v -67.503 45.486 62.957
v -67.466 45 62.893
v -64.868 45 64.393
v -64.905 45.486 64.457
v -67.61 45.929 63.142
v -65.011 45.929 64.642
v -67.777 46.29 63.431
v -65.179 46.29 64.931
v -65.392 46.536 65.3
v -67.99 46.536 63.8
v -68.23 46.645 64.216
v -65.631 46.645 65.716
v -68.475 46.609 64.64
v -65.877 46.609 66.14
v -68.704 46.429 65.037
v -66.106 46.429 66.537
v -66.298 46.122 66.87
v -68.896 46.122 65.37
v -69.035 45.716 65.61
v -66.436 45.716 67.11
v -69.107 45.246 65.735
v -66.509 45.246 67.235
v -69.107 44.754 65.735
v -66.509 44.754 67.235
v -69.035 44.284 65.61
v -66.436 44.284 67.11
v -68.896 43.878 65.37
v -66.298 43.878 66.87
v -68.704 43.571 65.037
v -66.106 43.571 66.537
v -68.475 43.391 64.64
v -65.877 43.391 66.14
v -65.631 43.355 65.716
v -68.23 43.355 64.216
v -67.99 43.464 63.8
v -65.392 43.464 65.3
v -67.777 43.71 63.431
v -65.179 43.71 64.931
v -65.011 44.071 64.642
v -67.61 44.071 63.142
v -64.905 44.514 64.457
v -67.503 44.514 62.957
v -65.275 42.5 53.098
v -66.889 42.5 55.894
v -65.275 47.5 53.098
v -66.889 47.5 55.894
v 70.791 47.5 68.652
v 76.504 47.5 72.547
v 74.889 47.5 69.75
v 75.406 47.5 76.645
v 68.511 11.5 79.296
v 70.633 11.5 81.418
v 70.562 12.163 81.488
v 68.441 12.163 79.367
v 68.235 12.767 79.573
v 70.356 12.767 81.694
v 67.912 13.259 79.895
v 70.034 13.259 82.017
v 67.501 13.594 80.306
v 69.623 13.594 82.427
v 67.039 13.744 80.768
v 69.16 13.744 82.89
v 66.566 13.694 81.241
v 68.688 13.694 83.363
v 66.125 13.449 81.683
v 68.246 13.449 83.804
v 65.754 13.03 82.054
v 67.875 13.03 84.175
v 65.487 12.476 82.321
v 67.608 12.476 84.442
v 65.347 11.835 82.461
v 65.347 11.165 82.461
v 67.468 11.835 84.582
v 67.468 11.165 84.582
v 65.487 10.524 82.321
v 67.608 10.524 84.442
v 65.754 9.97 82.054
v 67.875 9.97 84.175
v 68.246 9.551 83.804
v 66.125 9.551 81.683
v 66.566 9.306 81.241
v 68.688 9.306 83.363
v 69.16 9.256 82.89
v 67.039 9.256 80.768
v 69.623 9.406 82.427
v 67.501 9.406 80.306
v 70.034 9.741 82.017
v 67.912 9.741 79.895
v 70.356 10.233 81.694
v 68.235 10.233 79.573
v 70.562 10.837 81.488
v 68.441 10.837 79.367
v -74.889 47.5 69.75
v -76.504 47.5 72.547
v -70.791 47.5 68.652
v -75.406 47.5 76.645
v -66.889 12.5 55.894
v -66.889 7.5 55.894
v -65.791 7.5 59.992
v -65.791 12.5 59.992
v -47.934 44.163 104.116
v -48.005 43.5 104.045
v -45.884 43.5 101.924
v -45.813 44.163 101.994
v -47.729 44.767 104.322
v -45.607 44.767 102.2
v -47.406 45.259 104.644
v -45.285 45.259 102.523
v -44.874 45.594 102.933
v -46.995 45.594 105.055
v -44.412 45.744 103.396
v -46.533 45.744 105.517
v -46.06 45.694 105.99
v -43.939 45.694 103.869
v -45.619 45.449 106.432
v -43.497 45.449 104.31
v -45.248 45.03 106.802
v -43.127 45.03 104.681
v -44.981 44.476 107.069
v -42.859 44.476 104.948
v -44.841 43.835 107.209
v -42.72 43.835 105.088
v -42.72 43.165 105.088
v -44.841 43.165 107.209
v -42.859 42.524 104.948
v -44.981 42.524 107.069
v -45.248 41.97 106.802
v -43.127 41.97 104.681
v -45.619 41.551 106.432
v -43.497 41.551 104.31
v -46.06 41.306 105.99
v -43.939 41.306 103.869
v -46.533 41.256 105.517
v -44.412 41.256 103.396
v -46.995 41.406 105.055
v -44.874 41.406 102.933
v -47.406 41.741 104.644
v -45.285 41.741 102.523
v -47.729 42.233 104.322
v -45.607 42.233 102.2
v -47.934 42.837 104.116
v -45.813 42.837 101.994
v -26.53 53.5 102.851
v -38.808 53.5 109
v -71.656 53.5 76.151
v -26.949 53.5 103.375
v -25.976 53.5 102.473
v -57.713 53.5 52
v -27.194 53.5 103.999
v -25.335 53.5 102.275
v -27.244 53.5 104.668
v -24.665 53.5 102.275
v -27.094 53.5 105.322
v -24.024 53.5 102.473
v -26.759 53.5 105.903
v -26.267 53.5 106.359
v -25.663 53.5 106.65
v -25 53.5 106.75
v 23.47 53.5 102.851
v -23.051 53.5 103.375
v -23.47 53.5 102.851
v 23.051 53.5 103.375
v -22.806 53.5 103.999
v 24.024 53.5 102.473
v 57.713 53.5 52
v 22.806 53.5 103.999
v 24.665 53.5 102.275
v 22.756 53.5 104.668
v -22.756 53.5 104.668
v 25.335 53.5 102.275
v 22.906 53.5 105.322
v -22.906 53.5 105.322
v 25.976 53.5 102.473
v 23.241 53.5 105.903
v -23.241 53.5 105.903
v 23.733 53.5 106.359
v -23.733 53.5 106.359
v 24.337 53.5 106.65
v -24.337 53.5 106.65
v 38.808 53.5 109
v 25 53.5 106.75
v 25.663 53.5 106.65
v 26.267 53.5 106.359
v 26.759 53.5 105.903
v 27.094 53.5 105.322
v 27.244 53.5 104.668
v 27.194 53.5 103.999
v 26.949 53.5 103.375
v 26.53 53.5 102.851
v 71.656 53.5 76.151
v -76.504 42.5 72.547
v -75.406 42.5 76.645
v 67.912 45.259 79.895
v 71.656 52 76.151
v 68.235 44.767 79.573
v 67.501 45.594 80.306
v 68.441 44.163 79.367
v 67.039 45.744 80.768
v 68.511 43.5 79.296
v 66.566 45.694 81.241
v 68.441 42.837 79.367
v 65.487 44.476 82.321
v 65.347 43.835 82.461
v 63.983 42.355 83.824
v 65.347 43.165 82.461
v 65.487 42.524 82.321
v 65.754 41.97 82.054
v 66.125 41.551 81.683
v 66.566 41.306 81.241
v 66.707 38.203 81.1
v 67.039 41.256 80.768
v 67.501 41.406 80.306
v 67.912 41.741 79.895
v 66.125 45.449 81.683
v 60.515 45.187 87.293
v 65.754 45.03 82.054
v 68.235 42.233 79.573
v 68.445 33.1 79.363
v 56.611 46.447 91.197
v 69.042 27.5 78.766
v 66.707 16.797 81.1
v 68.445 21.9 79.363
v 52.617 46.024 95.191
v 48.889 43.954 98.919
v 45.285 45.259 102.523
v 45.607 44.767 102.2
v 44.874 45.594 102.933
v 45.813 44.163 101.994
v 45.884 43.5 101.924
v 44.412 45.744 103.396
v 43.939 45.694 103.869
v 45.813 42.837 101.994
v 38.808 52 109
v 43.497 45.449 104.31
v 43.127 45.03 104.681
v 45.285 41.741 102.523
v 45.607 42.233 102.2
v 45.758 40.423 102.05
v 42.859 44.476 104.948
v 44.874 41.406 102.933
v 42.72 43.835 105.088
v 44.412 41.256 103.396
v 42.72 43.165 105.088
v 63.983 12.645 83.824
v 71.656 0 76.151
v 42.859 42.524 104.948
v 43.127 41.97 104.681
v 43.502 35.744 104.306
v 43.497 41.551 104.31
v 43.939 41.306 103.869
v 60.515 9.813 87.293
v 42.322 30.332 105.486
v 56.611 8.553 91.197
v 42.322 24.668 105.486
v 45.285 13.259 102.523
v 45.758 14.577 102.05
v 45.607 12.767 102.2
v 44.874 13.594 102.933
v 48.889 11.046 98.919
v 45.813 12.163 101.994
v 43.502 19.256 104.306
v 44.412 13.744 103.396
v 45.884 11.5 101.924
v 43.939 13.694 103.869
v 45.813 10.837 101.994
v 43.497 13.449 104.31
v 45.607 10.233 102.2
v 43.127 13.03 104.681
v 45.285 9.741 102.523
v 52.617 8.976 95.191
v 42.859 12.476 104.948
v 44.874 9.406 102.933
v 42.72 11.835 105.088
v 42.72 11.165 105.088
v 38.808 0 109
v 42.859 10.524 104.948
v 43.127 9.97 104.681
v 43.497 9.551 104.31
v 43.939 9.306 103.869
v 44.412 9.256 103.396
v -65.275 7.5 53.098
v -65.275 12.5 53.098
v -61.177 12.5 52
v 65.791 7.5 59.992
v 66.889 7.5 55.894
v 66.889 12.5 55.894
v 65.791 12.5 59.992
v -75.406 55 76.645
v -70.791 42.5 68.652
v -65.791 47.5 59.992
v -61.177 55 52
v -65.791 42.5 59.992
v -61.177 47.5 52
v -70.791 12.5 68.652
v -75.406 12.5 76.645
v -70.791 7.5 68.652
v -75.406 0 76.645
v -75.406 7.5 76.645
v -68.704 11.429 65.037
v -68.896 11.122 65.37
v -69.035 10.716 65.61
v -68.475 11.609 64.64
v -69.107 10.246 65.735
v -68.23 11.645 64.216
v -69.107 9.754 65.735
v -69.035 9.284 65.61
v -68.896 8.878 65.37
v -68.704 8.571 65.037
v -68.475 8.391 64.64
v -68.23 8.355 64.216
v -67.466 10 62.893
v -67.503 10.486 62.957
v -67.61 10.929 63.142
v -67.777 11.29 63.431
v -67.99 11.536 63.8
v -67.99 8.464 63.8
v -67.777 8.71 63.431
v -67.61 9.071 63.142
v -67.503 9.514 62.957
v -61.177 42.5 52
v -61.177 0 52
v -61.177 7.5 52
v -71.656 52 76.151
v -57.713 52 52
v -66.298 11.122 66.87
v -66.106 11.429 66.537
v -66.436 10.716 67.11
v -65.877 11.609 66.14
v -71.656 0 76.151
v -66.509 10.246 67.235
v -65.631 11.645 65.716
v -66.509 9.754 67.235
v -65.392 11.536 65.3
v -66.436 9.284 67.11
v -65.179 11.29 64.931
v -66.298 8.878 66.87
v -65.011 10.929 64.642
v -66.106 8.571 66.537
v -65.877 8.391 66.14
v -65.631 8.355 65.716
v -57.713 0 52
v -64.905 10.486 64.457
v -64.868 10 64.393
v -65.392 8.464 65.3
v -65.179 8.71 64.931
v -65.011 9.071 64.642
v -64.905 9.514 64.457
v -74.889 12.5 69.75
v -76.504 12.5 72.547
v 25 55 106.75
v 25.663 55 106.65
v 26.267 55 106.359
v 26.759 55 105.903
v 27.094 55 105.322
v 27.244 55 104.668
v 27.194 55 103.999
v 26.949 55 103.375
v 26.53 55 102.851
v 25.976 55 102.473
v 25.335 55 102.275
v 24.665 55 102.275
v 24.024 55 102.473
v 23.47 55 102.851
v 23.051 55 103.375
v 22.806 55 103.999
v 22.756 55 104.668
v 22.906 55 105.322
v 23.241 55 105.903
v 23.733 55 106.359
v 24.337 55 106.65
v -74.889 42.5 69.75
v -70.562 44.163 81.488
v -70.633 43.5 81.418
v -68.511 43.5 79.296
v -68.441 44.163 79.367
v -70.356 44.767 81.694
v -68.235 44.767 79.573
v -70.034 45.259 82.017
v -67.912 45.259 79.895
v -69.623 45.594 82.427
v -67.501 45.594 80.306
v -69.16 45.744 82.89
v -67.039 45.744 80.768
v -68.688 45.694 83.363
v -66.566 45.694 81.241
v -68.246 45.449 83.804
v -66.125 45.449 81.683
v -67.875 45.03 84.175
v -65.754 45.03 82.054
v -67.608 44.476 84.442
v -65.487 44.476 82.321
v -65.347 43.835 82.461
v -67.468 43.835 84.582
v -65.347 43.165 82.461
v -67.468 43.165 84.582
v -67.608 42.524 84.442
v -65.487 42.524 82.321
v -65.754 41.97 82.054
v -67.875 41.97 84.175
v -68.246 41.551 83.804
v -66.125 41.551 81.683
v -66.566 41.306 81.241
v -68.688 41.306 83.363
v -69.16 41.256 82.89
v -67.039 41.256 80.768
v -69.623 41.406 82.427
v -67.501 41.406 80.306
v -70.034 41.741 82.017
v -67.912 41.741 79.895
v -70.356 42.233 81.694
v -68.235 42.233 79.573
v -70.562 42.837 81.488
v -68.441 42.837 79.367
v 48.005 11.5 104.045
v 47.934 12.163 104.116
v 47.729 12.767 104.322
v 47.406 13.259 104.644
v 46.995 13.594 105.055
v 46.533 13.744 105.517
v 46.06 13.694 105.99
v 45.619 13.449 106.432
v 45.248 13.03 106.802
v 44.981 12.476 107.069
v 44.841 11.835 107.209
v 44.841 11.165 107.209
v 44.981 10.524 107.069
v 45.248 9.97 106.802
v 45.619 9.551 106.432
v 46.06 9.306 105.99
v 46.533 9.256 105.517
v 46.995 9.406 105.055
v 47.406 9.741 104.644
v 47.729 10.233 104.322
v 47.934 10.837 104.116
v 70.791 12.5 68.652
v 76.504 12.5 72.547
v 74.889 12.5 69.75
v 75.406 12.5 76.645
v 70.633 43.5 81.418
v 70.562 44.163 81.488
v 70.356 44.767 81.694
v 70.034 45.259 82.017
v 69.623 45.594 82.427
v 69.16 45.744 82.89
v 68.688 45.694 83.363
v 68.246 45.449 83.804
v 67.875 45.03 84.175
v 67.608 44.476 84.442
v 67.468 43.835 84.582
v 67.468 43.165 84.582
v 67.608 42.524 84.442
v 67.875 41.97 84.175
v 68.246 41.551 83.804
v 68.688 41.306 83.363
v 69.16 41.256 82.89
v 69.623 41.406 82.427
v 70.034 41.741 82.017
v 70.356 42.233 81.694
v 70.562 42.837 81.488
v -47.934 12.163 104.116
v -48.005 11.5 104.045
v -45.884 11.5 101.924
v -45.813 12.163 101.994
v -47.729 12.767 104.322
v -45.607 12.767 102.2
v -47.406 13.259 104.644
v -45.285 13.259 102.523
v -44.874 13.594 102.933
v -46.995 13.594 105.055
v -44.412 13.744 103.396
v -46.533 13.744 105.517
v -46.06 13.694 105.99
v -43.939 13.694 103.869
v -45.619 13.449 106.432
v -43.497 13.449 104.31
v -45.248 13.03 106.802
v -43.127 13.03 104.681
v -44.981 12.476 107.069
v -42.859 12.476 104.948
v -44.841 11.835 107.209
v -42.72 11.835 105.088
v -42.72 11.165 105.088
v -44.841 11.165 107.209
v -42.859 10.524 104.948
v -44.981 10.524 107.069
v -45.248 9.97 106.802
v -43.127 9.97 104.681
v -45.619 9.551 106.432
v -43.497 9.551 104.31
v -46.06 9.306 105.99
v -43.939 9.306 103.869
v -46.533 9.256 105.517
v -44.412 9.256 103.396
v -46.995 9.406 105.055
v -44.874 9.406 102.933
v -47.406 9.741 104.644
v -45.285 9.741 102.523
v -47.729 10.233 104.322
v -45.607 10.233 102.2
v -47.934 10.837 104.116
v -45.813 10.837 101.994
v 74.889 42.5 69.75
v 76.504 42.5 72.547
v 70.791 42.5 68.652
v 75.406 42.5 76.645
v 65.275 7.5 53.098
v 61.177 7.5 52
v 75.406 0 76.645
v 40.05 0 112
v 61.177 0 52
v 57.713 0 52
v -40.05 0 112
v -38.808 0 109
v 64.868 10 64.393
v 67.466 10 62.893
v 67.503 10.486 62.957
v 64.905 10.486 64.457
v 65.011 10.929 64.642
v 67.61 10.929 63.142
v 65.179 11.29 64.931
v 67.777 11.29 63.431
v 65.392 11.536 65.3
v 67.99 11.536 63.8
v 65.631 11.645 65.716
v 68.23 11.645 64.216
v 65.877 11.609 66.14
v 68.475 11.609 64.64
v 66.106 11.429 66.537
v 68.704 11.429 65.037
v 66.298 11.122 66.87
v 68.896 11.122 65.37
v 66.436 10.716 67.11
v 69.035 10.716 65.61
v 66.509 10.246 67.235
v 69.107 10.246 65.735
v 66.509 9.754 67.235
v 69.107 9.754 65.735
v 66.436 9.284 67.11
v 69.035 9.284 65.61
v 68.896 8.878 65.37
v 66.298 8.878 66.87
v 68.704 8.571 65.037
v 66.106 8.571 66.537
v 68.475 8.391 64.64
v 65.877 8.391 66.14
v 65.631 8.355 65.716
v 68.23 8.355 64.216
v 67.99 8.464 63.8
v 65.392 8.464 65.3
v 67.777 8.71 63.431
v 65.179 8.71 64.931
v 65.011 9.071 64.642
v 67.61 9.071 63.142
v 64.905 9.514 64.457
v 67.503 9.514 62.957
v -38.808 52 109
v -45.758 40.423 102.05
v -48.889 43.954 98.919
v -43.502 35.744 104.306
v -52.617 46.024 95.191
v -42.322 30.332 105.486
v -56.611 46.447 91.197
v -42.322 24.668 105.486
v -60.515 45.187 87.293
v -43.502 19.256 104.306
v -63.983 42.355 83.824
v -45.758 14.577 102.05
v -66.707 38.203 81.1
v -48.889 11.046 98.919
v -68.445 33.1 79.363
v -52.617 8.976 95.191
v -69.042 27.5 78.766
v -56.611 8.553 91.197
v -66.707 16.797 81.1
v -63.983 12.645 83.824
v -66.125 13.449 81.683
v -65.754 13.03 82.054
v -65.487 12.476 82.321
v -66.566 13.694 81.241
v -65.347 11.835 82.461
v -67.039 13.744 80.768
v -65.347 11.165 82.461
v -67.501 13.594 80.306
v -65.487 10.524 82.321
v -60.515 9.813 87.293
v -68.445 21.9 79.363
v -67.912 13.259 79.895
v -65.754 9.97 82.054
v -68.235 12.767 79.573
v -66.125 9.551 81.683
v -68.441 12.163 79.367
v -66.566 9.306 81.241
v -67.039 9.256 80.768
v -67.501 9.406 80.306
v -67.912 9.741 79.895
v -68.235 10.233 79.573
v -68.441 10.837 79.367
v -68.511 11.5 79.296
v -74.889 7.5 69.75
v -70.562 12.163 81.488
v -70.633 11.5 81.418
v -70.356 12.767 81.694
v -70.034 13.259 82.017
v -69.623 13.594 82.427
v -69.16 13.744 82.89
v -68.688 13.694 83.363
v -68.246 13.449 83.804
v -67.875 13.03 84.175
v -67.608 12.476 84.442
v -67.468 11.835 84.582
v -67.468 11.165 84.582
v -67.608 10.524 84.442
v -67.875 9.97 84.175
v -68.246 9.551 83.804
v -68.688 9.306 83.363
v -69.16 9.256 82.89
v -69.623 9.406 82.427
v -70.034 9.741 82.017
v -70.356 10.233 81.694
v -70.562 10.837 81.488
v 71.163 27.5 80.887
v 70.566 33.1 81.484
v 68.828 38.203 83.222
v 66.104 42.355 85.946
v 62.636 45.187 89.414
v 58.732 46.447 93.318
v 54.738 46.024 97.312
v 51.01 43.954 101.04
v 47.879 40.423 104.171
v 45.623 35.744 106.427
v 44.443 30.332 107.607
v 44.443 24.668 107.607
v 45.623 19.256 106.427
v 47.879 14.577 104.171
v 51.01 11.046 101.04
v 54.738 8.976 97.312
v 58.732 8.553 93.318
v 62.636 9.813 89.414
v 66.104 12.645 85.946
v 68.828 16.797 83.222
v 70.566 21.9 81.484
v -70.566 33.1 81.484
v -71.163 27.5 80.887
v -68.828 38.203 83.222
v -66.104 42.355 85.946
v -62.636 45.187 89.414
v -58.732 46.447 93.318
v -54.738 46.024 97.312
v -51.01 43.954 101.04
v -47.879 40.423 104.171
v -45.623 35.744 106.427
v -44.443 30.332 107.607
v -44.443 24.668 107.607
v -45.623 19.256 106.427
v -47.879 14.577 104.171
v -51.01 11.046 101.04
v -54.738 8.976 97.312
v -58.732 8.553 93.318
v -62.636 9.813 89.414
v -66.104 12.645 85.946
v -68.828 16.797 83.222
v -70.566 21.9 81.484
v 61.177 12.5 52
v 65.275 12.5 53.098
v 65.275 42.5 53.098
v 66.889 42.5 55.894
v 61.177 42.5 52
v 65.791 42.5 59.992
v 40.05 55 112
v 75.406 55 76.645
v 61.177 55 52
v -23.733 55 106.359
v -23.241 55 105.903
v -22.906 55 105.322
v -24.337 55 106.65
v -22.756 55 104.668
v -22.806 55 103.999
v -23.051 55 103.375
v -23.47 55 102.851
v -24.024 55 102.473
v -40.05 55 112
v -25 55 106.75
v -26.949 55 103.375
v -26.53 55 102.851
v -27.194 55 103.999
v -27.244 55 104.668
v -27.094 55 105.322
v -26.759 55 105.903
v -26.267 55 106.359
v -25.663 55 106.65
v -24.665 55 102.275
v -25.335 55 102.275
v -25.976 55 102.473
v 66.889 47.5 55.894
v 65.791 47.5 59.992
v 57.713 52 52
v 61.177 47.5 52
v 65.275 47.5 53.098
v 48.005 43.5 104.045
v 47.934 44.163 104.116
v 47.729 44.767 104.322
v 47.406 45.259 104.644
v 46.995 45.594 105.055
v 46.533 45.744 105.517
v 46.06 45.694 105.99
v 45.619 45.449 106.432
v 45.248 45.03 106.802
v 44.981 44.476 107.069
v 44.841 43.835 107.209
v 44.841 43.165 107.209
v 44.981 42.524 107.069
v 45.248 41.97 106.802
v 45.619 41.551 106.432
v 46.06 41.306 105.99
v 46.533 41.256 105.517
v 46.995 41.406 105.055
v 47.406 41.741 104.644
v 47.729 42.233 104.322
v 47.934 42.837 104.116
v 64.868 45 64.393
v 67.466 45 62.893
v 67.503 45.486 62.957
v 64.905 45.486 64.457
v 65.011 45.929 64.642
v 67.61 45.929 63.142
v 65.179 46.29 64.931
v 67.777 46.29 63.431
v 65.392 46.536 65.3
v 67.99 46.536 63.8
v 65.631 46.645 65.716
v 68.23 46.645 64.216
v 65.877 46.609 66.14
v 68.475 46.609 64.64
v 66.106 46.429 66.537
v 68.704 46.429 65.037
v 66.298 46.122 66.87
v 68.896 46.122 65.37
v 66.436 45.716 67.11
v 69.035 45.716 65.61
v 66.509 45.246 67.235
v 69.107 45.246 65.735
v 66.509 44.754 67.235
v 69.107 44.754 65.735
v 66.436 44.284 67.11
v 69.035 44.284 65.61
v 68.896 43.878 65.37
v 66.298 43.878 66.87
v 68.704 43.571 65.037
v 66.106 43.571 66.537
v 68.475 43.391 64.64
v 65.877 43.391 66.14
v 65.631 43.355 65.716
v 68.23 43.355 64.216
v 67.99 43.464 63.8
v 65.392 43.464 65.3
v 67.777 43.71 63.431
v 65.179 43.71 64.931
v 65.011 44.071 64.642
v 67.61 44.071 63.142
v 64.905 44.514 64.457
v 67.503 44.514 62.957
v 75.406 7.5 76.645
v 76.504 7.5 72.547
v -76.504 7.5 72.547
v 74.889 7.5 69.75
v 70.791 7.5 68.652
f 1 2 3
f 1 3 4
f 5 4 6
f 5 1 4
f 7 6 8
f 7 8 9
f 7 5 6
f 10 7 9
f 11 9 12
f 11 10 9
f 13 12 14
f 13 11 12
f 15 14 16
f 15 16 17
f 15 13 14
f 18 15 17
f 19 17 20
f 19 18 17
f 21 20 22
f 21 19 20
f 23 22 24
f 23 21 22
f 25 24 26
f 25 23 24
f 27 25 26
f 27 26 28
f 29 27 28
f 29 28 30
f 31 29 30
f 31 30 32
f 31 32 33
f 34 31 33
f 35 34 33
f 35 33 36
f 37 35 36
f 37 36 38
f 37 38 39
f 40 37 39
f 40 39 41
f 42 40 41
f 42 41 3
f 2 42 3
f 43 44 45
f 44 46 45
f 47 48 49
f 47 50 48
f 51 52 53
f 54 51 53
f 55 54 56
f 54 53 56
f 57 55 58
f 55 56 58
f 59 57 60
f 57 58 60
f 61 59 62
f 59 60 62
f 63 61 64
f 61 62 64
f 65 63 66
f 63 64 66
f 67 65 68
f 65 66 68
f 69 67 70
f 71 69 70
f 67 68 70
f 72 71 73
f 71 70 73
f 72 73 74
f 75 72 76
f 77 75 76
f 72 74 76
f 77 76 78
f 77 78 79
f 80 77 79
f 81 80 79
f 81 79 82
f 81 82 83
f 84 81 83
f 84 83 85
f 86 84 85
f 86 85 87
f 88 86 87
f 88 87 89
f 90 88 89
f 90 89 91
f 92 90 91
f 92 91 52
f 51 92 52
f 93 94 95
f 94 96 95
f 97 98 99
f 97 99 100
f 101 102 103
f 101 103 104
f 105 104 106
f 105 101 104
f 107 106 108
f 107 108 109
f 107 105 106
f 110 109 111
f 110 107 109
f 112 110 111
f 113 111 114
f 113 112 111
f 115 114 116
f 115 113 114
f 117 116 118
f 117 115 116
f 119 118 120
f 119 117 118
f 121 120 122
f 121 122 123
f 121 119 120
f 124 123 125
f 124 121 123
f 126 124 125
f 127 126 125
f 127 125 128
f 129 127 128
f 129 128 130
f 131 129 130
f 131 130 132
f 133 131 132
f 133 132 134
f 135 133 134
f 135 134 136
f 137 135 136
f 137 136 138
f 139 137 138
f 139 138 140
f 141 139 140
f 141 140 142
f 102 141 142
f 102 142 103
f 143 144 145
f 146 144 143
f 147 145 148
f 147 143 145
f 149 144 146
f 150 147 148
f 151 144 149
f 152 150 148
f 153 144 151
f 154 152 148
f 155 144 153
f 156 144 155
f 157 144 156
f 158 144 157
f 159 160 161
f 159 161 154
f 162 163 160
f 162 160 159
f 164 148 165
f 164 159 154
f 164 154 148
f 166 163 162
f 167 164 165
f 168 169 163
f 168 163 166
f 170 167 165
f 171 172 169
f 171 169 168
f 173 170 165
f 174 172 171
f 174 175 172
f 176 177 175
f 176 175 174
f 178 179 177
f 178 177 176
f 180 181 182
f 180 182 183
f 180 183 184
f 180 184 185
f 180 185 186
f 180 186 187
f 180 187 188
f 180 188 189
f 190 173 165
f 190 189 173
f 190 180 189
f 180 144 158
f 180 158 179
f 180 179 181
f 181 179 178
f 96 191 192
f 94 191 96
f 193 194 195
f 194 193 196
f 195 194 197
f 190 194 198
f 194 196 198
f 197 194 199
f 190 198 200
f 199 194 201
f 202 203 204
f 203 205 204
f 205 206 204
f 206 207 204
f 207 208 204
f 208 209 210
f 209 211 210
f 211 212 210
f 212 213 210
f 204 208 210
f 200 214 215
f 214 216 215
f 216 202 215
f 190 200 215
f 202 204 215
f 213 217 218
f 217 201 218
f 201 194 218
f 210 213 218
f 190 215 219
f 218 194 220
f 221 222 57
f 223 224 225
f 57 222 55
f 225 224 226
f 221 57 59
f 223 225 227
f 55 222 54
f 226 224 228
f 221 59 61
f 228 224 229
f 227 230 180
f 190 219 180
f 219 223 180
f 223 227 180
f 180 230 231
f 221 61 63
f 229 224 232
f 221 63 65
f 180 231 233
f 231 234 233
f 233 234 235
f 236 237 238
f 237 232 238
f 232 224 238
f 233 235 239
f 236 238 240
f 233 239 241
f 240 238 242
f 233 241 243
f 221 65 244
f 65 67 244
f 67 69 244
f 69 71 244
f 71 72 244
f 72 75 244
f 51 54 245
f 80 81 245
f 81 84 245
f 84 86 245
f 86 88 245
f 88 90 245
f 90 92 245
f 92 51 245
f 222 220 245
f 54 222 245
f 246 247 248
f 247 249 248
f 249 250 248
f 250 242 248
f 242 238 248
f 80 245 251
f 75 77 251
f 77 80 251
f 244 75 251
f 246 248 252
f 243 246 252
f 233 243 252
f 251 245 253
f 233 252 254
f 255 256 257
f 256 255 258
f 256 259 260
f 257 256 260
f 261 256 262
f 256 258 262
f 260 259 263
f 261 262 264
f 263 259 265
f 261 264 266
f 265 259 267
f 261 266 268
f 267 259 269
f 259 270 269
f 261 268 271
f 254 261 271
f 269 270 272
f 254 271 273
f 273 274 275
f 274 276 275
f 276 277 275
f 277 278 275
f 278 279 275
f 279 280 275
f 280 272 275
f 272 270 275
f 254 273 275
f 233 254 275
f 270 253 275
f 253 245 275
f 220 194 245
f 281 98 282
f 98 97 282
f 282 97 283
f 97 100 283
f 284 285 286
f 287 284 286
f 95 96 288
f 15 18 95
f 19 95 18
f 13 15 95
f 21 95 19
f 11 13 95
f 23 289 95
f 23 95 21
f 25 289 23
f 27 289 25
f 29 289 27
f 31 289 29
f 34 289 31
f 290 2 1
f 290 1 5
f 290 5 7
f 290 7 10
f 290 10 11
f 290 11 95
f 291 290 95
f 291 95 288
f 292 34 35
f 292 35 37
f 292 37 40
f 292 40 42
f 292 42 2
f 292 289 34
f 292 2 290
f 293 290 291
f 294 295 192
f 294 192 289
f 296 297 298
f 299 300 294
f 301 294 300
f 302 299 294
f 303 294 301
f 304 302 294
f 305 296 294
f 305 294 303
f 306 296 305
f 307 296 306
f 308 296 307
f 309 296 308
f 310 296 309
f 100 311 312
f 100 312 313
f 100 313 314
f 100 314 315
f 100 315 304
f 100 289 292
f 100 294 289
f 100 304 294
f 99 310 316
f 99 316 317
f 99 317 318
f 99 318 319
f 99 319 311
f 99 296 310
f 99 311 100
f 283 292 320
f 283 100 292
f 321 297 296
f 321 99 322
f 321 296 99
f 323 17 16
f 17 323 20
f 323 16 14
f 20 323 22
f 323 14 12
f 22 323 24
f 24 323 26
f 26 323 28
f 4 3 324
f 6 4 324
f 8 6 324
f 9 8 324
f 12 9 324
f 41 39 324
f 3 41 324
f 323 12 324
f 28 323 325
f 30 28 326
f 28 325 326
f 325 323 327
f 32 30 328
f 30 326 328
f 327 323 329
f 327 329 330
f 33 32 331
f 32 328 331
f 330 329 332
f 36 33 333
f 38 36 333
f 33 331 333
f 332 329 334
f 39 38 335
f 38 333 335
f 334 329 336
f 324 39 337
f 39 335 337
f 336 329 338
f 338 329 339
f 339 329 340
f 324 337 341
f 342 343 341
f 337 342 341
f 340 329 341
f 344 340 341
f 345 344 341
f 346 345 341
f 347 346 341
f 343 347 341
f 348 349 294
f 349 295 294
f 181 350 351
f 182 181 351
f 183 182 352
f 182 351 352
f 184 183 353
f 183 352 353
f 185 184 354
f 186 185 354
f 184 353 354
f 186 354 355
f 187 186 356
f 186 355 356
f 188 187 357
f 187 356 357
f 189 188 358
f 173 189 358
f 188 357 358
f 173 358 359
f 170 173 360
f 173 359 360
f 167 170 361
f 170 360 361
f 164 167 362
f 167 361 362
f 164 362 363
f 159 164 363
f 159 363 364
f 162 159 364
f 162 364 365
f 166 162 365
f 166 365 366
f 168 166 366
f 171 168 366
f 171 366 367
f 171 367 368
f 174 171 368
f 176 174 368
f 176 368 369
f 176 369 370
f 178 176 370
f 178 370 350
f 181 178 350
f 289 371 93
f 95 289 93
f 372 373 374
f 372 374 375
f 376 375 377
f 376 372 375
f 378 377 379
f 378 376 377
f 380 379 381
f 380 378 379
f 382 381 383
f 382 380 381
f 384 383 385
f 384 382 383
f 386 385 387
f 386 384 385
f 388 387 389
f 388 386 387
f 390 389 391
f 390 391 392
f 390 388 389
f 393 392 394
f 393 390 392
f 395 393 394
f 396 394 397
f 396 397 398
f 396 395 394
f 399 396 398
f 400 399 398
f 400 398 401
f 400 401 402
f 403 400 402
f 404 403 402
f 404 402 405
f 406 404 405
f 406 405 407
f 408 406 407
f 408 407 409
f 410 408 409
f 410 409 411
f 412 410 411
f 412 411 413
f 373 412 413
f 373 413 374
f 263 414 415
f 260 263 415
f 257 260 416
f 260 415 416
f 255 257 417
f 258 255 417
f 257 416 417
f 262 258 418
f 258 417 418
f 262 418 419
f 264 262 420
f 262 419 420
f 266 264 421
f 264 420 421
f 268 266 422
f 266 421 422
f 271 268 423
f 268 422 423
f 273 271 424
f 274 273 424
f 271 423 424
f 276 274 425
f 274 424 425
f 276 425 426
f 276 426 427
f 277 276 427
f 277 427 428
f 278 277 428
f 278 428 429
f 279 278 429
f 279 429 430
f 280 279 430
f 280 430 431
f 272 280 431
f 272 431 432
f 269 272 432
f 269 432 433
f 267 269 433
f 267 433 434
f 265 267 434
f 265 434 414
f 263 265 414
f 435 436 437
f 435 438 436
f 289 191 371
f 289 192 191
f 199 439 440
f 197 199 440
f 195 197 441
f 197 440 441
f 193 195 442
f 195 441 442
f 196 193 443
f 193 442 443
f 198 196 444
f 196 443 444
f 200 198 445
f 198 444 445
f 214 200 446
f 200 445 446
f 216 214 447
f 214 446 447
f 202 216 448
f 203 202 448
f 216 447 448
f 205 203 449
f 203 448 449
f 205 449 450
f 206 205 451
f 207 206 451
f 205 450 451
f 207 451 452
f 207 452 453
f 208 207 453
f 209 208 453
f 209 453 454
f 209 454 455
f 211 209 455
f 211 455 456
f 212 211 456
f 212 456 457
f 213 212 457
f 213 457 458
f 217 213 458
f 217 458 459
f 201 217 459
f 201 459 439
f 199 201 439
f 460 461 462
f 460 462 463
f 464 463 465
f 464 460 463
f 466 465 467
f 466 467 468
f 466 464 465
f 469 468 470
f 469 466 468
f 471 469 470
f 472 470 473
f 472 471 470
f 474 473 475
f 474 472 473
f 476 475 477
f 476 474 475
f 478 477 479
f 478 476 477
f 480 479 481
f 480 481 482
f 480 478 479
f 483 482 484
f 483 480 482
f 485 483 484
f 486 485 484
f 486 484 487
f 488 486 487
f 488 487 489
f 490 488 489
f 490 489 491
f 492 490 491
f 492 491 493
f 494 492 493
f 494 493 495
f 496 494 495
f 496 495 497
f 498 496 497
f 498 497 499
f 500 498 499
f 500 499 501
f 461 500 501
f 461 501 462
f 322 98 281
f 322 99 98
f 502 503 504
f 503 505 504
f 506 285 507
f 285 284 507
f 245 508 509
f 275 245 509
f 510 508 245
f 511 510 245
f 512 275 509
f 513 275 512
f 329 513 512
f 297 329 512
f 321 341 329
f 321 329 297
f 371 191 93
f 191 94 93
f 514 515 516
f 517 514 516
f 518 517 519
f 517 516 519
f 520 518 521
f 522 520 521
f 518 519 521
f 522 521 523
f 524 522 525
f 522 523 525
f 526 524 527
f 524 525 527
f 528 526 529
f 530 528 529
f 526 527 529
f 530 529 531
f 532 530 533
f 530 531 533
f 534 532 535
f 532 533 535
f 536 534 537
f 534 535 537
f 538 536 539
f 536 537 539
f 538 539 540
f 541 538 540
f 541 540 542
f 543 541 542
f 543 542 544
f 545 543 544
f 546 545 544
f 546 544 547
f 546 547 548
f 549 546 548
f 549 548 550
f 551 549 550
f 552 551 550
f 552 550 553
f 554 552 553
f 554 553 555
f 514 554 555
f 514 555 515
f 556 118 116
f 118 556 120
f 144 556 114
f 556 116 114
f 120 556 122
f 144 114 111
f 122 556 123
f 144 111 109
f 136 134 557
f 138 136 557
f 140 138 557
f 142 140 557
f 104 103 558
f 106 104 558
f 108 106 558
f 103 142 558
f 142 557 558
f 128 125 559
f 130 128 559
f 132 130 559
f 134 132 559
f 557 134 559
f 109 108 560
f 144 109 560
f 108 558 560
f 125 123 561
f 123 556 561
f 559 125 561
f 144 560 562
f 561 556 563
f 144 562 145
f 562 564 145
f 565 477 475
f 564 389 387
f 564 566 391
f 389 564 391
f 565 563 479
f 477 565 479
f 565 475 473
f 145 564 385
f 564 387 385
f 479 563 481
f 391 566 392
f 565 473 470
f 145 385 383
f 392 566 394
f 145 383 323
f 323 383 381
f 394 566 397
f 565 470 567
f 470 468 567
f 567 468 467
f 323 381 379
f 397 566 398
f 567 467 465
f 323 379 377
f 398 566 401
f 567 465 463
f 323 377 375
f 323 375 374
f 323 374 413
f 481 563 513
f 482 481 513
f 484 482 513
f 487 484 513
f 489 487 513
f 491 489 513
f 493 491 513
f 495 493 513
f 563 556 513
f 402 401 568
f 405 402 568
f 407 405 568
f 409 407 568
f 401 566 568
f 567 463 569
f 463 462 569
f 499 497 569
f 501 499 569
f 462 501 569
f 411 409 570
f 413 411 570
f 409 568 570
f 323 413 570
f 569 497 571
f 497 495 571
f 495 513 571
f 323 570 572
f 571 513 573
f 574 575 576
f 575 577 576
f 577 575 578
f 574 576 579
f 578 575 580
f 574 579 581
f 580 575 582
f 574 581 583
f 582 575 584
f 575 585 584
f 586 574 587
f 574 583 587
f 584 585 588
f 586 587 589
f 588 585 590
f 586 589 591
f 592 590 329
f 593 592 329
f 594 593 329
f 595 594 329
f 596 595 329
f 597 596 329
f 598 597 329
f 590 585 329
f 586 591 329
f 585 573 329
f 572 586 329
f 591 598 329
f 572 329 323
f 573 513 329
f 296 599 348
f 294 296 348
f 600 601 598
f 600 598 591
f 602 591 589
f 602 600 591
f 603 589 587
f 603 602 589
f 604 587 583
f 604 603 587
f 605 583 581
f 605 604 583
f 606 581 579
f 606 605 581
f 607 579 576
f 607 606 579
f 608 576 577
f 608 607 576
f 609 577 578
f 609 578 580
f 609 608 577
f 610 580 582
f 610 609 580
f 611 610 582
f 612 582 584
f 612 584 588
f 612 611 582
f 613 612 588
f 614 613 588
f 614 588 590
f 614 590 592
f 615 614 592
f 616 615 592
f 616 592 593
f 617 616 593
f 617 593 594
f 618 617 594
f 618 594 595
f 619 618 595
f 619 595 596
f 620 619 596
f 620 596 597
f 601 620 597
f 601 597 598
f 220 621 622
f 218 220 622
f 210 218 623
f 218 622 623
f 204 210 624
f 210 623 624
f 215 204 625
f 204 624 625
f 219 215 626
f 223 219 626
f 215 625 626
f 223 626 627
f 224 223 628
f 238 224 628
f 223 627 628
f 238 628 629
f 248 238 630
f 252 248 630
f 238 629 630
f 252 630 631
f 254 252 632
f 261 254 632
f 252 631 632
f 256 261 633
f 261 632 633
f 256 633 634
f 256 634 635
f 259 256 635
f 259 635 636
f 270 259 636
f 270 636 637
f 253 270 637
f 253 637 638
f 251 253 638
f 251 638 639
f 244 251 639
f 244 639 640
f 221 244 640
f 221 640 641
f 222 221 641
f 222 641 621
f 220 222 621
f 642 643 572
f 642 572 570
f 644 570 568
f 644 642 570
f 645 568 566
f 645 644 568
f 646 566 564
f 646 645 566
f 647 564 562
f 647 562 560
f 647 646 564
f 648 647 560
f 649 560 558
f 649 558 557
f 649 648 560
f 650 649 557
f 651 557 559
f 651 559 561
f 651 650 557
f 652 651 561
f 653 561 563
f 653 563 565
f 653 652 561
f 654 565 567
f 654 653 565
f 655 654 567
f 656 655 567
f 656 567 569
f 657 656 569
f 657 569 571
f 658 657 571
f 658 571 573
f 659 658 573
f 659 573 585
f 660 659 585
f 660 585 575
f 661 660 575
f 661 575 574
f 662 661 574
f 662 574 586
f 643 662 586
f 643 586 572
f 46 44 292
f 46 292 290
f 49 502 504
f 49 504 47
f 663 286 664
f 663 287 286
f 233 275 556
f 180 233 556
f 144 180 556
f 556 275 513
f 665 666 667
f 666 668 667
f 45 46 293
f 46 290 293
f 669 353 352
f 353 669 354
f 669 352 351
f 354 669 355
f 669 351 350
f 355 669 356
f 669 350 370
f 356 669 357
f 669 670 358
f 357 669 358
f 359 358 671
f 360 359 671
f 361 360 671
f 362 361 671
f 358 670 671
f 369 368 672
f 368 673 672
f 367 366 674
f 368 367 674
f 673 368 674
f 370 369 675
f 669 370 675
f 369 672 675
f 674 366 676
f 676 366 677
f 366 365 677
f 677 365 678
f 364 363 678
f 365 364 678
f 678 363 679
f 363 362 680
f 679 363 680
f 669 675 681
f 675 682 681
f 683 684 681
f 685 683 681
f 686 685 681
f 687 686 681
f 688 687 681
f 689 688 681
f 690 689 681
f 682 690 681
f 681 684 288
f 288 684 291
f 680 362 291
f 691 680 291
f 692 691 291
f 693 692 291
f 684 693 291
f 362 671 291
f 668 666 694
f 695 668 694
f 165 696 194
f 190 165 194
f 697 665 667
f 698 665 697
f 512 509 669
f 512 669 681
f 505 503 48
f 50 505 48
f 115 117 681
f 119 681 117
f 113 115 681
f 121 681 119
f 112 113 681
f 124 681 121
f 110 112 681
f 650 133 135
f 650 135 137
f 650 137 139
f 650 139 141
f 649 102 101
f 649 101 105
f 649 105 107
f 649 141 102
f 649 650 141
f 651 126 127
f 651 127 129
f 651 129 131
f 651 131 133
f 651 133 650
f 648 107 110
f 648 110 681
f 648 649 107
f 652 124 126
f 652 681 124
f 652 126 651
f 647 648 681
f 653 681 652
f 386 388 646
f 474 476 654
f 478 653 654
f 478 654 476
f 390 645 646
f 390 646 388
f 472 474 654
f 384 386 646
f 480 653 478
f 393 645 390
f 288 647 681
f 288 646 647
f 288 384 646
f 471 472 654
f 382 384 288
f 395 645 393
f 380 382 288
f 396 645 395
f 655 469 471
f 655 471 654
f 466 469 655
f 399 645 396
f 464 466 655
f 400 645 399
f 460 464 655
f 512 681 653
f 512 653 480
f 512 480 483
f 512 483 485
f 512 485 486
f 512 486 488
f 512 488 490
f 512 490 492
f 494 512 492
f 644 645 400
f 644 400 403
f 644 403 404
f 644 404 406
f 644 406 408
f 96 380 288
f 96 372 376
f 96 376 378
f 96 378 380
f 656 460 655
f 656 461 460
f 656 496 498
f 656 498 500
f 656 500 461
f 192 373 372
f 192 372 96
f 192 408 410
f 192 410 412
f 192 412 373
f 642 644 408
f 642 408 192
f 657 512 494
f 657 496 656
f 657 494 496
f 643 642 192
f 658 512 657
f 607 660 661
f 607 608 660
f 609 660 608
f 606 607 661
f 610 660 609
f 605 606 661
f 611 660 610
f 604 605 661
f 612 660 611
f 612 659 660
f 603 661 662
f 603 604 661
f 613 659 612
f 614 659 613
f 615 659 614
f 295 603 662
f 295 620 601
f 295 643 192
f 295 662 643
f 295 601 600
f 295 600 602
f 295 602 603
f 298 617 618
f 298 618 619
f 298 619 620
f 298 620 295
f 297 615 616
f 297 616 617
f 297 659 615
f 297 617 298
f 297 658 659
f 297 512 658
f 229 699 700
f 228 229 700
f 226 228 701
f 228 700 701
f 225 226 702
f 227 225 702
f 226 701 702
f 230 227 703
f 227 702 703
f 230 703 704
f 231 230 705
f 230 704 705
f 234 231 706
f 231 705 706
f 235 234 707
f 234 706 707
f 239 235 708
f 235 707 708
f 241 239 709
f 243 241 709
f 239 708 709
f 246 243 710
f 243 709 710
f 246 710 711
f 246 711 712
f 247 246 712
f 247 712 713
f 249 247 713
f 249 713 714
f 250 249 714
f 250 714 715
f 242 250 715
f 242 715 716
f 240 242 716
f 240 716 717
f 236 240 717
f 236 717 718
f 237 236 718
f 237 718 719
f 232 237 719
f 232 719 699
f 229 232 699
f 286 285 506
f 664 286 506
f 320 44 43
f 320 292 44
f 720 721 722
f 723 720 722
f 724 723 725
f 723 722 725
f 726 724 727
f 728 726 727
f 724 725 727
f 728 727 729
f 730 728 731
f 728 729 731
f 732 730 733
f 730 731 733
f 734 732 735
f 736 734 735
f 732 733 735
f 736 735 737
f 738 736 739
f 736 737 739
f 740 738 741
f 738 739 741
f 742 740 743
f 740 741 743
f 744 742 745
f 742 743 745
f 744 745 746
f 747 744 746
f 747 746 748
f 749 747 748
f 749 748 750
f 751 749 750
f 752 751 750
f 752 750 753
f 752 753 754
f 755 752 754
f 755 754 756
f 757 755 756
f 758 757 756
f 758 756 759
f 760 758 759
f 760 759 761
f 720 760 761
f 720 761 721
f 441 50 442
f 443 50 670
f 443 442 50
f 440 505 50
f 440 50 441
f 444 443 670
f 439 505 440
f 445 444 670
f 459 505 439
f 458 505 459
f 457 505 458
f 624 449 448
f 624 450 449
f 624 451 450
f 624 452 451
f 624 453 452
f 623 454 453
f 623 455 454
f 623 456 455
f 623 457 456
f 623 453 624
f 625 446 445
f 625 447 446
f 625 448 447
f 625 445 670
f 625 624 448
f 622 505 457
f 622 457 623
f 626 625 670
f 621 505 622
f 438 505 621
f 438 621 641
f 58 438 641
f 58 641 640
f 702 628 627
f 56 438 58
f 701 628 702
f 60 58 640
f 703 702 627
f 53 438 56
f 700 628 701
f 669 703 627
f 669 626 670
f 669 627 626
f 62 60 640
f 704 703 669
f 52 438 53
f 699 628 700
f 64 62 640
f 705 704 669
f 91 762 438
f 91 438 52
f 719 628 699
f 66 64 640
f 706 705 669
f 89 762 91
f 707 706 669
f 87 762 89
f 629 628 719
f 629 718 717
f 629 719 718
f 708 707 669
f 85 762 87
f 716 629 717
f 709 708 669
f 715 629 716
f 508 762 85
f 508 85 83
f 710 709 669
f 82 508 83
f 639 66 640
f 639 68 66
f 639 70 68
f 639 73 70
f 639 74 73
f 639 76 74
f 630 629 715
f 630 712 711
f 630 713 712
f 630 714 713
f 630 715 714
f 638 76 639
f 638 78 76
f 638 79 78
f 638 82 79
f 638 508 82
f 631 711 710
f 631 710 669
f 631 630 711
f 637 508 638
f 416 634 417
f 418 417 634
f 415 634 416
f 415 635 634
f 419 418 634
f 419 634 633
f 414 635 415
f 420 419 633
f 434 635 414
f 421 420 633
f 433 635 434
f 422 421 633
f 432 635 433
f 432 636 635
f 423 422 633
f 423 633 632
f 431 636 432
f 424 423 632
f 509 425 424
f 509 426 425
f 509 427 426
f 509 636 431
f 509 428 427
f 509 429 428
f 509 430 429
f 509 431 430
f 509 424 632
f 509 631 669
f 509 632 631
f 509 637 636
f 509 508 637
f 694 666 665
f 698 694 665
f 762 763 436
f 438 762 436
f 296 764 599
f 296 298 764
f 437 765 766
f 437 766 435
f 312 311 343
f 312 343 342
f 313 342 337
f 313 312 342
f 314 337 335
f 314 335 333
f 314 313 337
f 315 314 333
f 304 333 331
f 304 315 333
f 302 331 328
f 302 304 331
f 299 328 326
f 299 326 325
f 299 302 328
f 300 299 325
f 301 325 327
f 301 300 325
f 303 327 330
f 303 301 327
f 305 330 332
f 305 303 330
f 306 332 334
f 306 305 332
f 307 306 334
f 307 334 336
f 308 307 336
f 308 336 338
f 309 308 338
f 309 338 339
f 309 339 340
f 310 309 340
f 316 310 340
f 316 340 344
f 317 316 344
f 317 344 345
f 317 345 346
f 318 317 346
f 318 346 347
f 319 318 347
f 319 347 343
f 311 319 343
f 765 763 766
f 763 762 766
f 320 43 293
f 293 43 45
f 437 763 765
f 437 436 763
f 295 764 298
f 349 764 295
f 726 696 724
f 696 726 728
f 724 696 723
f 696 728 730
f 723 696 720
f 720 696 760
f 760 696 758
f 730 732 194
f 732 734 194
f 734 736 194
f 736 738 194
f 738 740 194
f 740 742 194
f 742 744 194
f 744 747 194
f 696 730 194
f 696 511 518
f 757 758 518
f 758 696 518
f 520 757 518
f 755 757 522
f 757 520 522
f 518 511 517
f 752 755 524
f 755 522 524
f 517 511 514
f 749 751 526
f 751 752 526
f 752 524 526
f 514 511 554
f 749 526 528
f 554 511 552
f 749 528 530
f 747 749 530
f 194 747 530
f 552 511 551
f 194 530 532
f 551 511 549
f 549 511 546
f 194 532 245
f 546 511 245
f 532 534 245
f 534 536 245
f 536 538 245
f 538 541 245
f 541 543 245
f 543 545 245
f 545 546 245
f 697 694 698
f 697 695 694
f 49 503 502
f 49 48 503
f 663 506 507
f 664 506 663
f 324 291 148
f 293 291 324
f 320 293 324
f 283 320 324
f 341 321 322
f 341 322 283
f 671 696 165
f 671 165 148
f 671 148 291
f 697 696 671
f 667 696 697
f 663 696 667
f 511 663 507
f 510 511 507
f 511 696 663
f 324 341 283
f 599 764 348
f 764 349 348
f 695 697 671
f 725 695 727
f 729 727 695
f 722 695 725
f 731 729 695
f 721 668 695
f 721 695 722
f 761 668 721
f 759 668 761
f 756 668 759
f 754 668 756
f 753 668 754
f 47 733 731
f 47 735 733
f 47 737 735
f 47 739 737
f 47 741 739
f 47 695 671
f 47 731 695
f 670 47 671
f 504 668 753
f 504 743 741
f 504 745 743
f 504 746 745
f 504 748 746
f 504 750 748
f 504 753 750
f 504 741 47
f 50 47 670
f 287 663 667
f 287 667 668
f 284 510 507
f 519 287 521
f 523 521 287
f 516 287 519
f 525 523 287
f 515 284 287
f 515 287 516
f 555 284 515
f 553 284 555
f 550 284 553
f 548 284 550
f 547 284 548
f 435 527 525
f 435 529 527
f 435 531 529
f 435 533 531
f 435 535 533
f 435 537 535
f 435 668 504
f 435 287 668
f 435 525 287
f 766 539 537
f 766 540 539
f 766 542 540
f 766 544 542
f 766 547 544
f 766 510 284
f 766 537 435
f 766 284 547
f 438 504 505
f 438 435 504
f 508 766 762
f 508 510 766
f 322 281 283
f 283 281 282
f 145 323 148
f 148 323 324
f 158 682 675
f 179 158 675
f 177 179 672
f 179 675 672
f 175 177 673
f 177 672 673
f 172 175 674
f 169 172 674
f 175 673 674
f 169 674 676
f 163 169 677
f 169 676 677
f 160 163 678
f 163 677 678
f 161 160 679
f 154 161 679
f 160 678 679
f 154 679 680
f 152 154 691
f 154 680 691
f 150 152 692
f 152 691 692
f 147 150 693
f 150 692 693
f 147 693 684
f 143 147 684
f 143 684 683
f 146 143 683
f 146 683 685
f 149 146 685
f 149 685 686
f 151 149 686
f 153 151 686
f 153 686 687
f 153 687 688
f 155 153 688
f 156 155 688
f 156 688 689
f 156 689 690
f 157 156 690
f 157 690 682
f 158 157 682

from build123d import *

# Parameters (mm, degrees)
BOSS_EXTRUDE1_DEPTH      = 55
SHELL1_T                 = -3
CUT_EXTRUDE1_REACH       = 167.077
SKETCH2_R                = 19
SKETCH2_R_2              = 2.25
CUT_EXTRUDE2_REACH       = 170.904
SKETCH3_R                = 1.65
SKETCH4_W                = 9.228601628
SKETCH4_H                = 5
BOSS_EXTRUDE2_DEPTH      = 3
CHAMFER1_SIZE            = 3
CHAMFER1_OF_MIRROR2_SIZE = 3
SKETCH5_R                = 2.25
CUT_EXTRUDE3_DEPTH       = 147.36190521
CUT_EXTRUDE4_DEPTH       = 1.5


with BuildPart() as part:
    # Sketch1 → Boss-Extrude1 (new body)
    with BuildSketch(Plane(origin=(0, 0, 0), x_dir=(1, 0, 0), z_dir=(0, 1, 0))):
        Polygon((40.050177105, -112), (-40.050177105, -112), (-75.405516164, -76.644660941), (-61.176914536, -52), (61.176914536, -52), (75.405516164, -76.644660941), align=None)
    extrude(amount=BOSS_EXTRUDE1_DEPTH)

    # Shell1
    shell1_openings = [part.faces().sort_by_distance(p)[0] for p in [
        (0, 27.5, 52),
        (0, 0, 79.968655268),
    ]]
    offset(amount=SHELL1_T, openings=shell1_openings, kind=Kind.INTERSECTION)

    # Sketch2 → Cut-Extrude1 (cut, up to next)
    with BuildSketch(Plane(origin=(76.025088553, 0, 76.025088553), x_dir=(0.7071067811865462, 0, -0.7071067811865488), z_dir=(0.7071067811865488, 0, 0.7071067811865462)), mode=Mode.PRIVATE) as cut_extrude1_sk1:
        with Locations((-25.876207674, 27.5)):
            Circle(SKETCH2_R)
    cut_extrude1_tool1 = extrude(cut_extrude1_sk1.sketch, amount=-CUT_EXTRUDE1_REACH, mode=Mode.PRIVATE) & part.part
    # Sketch2 → Cut-Extrude1 (cut, up to next)
    with BuildSketch(Plane(origin=(76.025088553, 0, 76.025088553), x_dir=(0.7071067811865462, 0, -0.7071067811865488), z_dir=(0.7071067811865488, 0, 0.7071067811865462)), mode=Mode.PRIVATE) as cut_extrude1_sk2:
        with Locations((-41.876207674, 11.5)):
            Circle(SKETCH2_R_2)
    cut_extrude1_tool2 = extrude(cut_extrude1_sk2.sketch, amount=-CUT_EXTRUDE1_REACH, mode=Mode.PRIVATE) & part.part
    # Sketch2 → Cut-Extrude1 (cut, up to next)
    with BuildSketch(Plane(origin=(76.025088553, 0, 76.025088553), x_dir=(0.7071067811865462, 0, -0.7071067811865488), z_dir=(0.7071067811865488, 0, 0.7071067811865462)), mode=Mode.PRIVATE) as cut_extrude1_sk3:
        with Locations((-9.876207674, 11.5)):
            Circle(SKETCH2_R_2)
    cut_extrude1_tool3 = extrude(cut_extrude1_sk3.sketch, amount=-CUT_EXTRUDE1_REACH, mode=Mode.PRIVATE) & part.part
    # Sketch2 → Cut-Extrude1 (cut, up to next)
    with BuildSketch(Plane(origin=(76.025088553, 0, 76.025088553), x_dir=(0.7071067811865462, 0, -0.7071067811865488), z_dir=(0.7071067811865488, 0, 0.7071067811865462)), mode=Mode.PRIVATE) as cut_extrude1_sk4:
        with Locations((-9.876207674, 43.5)):
            Circle(SKETCH2_R_2)
    cut_extrude1_tool4 = extrude(cut_extrude1_sk4.sketch, amount=-CUT_EXTRUDE1_REACH, mode=Mode.PRIVATE) & part.part
    # Sketch2 → Cut-Extrude1 (cut, up to next)
    with BuildSketch(Plane(origin=(76.025088553, 0, 76.025088553), x_dir=(0.7071067811865462, 0, -0.7071067811865488), z_dir=(0.7071067811865488, 0, 0.7071067811865462)), mode=Mode.PRIVATE) as cut_extrude1_sk5:
        with Locations((-41.876207674, 43.5)):
            Circle(SKETCH2_R_2)
    cut_extrude1_tool5 = extrude(cut_extrude1_sk5.sketch, amount=-CUT_EXTRUDE1_REACH, mode=Mode.PRIVATE) & part.part
    cut_extrude1_1 = cut_extrude1_tool1.solids().sort_by_distance((57.727847, 27.5, 94.32233))[0]
    add(cut_extrude1_1, mode=Mode.SUBTRACT)
    cut_extrude1_2 = cut_extrude1_tool2.solids().sort_by_distance((46.414138, 11.5, 105.636039))[0]
    add(cut_extrude1_2, mode=Mode.SUBTRACT)
    cut_extrude1_3 = cut_extrude1_tool3.solids().sort_by_distance((69.041555, 11.5, 83.008622))[0]
    add(cut_extrude1_3, mode=Mode.SUBTRACT)
    cut_extrude1_4 = cut_extrude1_tool4.solids().sort_by_distance((69.041555, 43.5, 83.008622))[0]
    add(cut_extrude1_4, mode=Mode.SUBTRACT)
    cut_extrude1_5 = cut_extrude1_tool5.solids().sort_by_distance((46.414138, 43.5, 105.636039))[0]
    add(cut_extrude1_5, mode=Mode.SUBTRACT)
    cut_extrude1 = cut_extrude1_1 + cut_extrude1_2 + cut_extrude1_3 + cut_extrude1_4 + cut_extrude1_5  # Cut-Extrude1 as one shape, for the pattern or mirror that repeats it

    # Sketch3 → Cut-Extrude2 (cut, up to next)
    with BuildSketch(Plane(origin=(23.366025404, 0, -13.490381057), x_dir=(-0.5000000000000074, 0, -0.8660254037844345), z_dir=(0.8660254037844344, 0, -0.5000000000000073)), mode=Mode.PRIVATE) as cut_extrude2_sk1:
        with Locations((-89.850379893, 10)):
            Circle(SKETCH3_R)
    cut_extrude2_tool1 = extrude(cut_extrude2_sk1.sketch, amount=-CUT_EXTRUDE2_REACH, mode=Mode.PRIVATE) & part.part
    # Sketch3 → Cut-Extrude2 (cut, up to next)
    with BuildSketch(Plane(origin=(23.366025404, 0, -13.490381057), x_dir=(-0.5000000000000074, 0, -0.8660254037844345), z_dir=(0.8660254037844344, 0, -0.5000000000000073)), mode=Mode.PRIVATE) as cut_extrude2_sk2:
        with Locations((-89.850379893, 45)):
            Circle(SKETCH3_R)
    cut_extrude2_tool2 = extrude(cut_extrude2_sk2.sketch, amount=-CUT_EXTRUDE2_REACH, mode=Mode.PRIVATE) & part.part
    cut_extrude2_1 = cut_extrude2_tool1.solids().sort_by_distance((68.291215, 10, 64.32233))[0]
    add(cut_extrude2_1, mode=Mode.SUBTRACT)
    cut_extrude2_2 = cut_extrude2_tool2.solids().sort_by_distance((68.291215, 45, 64.32233))[0]
    add(cut_extrude2_2, mode=Mode.SUBTRACT)
    cut_extrude2 = cut_extrude2_1 + cut_extrude2_2  # Cut-Extrude2 as one shape, for the pattern or mirror that repeats it

    # Sketch4 → Boss-Extrude2 (add)
    with BuildSketch(Plane(origin=(23.366025404, 0, -13.490381057), x_dir=(-0.5000000000000074, 0, -0.8660254037844345), z_dir=(0.8660254037844344, 0, -0.5000000000000073))):
        with Locations((-80.236079079, 10)):
            Rectangle(SKETCH4_W, SKETCH4_H)
        with Locations((-99.464680707, 10)):
            Rectangle(SKETCH4_W, SKETCH4_H)
        with Locations((-80.236079079, 45)):
            Rectangle(SKETCH4_W, SKETCH4_H)
        with Locations((-99.464680707, 45)):
            Rectangle(SKETCH4_W, SKETCH4_H)
    boss_extrude2 = extrude(amount=BOSS_EXTRUDE2_DEPTH)

    # Chamfer1
    chamfer1_edges = [part.edges().sort_by_distance(p)[0] for p in [
        (63.774990748, 10, 50.5),
        (63.774990748, 45, 50.5),
        (68.389291562, 45, 58.492203451),
        (68.389291562, 10, 58.492203451),
        (73.389291562, 10, 67.152457489),
        (73.389291562, 45, 67.152457489),
        (78.003592376, 10, 75.144660941),
        (78.003592376, 45, 75.144660941),
    ]]
    chamfer(chamfer1_edges, length=CHAMFER1_SIZE - 0.0001)  # a hair under: the kernel refuses the full size

    # Mirror2: Cut-Extrude1, Cut-Extrude2, Boss-Extrude2 across plane
    add(cut_extrude1.mirror(Plane(origin=(0, 0, 0), x_dir=(0, 0, 1), z_dir=(1, 0, 0))), mode=Mode.SUBTRACT)
    add(cut_extrude2.mirror(Plane(origin=(0, 0, 0), x_dir=(0, 0, 1), z_dir=(1, 0, 0))), mode=Mode.SUBTRACT)
    add(boss_extrude2.mirror(Plane(origin=(0, 0, 0), x_dir=(0, 0, 1), z_dir=(1, 0, 0))))

    # Chamfer1 of Mirror2
    chamfer1_of_mirror2_edges = [part.edges().sort_by_distance(p)[0] for p in [
        (-63.774990748, 10, 50.5),
        (-63.774990748, 45, 50.5),
        (-68.389291562, 45, 58.492203451),
        (-68.389291562, 10, 58.492203451),
        (-73.389291562, 10, 67.152457489),
        (-73.389291562, 45, 67.152457489),
        (-78.003592376, 10, 75.144660941),
        (-78.003592376, 45, 75.144660941),
    ]]
    chamfer(chamfer1_of_mirror2_edges, length=CHAMFER1_OF_MIRROR2_SIZE - 0.0001)  # a hair under: the kernel refuses the full size

    # Sketch5 → Cut-Extrude3 (cut, through all)
    with BuildSketch(Plane(origin=(0, 55, 0), x_dir=(1, 0, 0), z_dir=(0, 1, 0))):
        with Locations(Location((-25, -104.5, 0), (0, 0, 270))):
            Circle(SKETCH5_R)
        with Locations(Location((25, -104.5, 0), (0, 0, 270))):
            Circle(SKETCH5_R)
    extrude(amount=-CUT_EXTRUDE3_DEPTH, mode=Mode.SUBTRACT)

    # Sketch6 → Cut-Extrude4 (cut)
    with BuildSketch(Plane.XZ.offset(-52)):
        Polygon((-57.712812921, 52), (57.712812921, 52), (71.656449471, 76.151086947), (38.807536418, 109), (-38.807536418, 109), (-71.656449471, 76.151086947), align=None)
    extrude(amount=-CUT_EXTRUDE4_DEPTH, mode=Mode.SUBTRACT)


solid = part.part
